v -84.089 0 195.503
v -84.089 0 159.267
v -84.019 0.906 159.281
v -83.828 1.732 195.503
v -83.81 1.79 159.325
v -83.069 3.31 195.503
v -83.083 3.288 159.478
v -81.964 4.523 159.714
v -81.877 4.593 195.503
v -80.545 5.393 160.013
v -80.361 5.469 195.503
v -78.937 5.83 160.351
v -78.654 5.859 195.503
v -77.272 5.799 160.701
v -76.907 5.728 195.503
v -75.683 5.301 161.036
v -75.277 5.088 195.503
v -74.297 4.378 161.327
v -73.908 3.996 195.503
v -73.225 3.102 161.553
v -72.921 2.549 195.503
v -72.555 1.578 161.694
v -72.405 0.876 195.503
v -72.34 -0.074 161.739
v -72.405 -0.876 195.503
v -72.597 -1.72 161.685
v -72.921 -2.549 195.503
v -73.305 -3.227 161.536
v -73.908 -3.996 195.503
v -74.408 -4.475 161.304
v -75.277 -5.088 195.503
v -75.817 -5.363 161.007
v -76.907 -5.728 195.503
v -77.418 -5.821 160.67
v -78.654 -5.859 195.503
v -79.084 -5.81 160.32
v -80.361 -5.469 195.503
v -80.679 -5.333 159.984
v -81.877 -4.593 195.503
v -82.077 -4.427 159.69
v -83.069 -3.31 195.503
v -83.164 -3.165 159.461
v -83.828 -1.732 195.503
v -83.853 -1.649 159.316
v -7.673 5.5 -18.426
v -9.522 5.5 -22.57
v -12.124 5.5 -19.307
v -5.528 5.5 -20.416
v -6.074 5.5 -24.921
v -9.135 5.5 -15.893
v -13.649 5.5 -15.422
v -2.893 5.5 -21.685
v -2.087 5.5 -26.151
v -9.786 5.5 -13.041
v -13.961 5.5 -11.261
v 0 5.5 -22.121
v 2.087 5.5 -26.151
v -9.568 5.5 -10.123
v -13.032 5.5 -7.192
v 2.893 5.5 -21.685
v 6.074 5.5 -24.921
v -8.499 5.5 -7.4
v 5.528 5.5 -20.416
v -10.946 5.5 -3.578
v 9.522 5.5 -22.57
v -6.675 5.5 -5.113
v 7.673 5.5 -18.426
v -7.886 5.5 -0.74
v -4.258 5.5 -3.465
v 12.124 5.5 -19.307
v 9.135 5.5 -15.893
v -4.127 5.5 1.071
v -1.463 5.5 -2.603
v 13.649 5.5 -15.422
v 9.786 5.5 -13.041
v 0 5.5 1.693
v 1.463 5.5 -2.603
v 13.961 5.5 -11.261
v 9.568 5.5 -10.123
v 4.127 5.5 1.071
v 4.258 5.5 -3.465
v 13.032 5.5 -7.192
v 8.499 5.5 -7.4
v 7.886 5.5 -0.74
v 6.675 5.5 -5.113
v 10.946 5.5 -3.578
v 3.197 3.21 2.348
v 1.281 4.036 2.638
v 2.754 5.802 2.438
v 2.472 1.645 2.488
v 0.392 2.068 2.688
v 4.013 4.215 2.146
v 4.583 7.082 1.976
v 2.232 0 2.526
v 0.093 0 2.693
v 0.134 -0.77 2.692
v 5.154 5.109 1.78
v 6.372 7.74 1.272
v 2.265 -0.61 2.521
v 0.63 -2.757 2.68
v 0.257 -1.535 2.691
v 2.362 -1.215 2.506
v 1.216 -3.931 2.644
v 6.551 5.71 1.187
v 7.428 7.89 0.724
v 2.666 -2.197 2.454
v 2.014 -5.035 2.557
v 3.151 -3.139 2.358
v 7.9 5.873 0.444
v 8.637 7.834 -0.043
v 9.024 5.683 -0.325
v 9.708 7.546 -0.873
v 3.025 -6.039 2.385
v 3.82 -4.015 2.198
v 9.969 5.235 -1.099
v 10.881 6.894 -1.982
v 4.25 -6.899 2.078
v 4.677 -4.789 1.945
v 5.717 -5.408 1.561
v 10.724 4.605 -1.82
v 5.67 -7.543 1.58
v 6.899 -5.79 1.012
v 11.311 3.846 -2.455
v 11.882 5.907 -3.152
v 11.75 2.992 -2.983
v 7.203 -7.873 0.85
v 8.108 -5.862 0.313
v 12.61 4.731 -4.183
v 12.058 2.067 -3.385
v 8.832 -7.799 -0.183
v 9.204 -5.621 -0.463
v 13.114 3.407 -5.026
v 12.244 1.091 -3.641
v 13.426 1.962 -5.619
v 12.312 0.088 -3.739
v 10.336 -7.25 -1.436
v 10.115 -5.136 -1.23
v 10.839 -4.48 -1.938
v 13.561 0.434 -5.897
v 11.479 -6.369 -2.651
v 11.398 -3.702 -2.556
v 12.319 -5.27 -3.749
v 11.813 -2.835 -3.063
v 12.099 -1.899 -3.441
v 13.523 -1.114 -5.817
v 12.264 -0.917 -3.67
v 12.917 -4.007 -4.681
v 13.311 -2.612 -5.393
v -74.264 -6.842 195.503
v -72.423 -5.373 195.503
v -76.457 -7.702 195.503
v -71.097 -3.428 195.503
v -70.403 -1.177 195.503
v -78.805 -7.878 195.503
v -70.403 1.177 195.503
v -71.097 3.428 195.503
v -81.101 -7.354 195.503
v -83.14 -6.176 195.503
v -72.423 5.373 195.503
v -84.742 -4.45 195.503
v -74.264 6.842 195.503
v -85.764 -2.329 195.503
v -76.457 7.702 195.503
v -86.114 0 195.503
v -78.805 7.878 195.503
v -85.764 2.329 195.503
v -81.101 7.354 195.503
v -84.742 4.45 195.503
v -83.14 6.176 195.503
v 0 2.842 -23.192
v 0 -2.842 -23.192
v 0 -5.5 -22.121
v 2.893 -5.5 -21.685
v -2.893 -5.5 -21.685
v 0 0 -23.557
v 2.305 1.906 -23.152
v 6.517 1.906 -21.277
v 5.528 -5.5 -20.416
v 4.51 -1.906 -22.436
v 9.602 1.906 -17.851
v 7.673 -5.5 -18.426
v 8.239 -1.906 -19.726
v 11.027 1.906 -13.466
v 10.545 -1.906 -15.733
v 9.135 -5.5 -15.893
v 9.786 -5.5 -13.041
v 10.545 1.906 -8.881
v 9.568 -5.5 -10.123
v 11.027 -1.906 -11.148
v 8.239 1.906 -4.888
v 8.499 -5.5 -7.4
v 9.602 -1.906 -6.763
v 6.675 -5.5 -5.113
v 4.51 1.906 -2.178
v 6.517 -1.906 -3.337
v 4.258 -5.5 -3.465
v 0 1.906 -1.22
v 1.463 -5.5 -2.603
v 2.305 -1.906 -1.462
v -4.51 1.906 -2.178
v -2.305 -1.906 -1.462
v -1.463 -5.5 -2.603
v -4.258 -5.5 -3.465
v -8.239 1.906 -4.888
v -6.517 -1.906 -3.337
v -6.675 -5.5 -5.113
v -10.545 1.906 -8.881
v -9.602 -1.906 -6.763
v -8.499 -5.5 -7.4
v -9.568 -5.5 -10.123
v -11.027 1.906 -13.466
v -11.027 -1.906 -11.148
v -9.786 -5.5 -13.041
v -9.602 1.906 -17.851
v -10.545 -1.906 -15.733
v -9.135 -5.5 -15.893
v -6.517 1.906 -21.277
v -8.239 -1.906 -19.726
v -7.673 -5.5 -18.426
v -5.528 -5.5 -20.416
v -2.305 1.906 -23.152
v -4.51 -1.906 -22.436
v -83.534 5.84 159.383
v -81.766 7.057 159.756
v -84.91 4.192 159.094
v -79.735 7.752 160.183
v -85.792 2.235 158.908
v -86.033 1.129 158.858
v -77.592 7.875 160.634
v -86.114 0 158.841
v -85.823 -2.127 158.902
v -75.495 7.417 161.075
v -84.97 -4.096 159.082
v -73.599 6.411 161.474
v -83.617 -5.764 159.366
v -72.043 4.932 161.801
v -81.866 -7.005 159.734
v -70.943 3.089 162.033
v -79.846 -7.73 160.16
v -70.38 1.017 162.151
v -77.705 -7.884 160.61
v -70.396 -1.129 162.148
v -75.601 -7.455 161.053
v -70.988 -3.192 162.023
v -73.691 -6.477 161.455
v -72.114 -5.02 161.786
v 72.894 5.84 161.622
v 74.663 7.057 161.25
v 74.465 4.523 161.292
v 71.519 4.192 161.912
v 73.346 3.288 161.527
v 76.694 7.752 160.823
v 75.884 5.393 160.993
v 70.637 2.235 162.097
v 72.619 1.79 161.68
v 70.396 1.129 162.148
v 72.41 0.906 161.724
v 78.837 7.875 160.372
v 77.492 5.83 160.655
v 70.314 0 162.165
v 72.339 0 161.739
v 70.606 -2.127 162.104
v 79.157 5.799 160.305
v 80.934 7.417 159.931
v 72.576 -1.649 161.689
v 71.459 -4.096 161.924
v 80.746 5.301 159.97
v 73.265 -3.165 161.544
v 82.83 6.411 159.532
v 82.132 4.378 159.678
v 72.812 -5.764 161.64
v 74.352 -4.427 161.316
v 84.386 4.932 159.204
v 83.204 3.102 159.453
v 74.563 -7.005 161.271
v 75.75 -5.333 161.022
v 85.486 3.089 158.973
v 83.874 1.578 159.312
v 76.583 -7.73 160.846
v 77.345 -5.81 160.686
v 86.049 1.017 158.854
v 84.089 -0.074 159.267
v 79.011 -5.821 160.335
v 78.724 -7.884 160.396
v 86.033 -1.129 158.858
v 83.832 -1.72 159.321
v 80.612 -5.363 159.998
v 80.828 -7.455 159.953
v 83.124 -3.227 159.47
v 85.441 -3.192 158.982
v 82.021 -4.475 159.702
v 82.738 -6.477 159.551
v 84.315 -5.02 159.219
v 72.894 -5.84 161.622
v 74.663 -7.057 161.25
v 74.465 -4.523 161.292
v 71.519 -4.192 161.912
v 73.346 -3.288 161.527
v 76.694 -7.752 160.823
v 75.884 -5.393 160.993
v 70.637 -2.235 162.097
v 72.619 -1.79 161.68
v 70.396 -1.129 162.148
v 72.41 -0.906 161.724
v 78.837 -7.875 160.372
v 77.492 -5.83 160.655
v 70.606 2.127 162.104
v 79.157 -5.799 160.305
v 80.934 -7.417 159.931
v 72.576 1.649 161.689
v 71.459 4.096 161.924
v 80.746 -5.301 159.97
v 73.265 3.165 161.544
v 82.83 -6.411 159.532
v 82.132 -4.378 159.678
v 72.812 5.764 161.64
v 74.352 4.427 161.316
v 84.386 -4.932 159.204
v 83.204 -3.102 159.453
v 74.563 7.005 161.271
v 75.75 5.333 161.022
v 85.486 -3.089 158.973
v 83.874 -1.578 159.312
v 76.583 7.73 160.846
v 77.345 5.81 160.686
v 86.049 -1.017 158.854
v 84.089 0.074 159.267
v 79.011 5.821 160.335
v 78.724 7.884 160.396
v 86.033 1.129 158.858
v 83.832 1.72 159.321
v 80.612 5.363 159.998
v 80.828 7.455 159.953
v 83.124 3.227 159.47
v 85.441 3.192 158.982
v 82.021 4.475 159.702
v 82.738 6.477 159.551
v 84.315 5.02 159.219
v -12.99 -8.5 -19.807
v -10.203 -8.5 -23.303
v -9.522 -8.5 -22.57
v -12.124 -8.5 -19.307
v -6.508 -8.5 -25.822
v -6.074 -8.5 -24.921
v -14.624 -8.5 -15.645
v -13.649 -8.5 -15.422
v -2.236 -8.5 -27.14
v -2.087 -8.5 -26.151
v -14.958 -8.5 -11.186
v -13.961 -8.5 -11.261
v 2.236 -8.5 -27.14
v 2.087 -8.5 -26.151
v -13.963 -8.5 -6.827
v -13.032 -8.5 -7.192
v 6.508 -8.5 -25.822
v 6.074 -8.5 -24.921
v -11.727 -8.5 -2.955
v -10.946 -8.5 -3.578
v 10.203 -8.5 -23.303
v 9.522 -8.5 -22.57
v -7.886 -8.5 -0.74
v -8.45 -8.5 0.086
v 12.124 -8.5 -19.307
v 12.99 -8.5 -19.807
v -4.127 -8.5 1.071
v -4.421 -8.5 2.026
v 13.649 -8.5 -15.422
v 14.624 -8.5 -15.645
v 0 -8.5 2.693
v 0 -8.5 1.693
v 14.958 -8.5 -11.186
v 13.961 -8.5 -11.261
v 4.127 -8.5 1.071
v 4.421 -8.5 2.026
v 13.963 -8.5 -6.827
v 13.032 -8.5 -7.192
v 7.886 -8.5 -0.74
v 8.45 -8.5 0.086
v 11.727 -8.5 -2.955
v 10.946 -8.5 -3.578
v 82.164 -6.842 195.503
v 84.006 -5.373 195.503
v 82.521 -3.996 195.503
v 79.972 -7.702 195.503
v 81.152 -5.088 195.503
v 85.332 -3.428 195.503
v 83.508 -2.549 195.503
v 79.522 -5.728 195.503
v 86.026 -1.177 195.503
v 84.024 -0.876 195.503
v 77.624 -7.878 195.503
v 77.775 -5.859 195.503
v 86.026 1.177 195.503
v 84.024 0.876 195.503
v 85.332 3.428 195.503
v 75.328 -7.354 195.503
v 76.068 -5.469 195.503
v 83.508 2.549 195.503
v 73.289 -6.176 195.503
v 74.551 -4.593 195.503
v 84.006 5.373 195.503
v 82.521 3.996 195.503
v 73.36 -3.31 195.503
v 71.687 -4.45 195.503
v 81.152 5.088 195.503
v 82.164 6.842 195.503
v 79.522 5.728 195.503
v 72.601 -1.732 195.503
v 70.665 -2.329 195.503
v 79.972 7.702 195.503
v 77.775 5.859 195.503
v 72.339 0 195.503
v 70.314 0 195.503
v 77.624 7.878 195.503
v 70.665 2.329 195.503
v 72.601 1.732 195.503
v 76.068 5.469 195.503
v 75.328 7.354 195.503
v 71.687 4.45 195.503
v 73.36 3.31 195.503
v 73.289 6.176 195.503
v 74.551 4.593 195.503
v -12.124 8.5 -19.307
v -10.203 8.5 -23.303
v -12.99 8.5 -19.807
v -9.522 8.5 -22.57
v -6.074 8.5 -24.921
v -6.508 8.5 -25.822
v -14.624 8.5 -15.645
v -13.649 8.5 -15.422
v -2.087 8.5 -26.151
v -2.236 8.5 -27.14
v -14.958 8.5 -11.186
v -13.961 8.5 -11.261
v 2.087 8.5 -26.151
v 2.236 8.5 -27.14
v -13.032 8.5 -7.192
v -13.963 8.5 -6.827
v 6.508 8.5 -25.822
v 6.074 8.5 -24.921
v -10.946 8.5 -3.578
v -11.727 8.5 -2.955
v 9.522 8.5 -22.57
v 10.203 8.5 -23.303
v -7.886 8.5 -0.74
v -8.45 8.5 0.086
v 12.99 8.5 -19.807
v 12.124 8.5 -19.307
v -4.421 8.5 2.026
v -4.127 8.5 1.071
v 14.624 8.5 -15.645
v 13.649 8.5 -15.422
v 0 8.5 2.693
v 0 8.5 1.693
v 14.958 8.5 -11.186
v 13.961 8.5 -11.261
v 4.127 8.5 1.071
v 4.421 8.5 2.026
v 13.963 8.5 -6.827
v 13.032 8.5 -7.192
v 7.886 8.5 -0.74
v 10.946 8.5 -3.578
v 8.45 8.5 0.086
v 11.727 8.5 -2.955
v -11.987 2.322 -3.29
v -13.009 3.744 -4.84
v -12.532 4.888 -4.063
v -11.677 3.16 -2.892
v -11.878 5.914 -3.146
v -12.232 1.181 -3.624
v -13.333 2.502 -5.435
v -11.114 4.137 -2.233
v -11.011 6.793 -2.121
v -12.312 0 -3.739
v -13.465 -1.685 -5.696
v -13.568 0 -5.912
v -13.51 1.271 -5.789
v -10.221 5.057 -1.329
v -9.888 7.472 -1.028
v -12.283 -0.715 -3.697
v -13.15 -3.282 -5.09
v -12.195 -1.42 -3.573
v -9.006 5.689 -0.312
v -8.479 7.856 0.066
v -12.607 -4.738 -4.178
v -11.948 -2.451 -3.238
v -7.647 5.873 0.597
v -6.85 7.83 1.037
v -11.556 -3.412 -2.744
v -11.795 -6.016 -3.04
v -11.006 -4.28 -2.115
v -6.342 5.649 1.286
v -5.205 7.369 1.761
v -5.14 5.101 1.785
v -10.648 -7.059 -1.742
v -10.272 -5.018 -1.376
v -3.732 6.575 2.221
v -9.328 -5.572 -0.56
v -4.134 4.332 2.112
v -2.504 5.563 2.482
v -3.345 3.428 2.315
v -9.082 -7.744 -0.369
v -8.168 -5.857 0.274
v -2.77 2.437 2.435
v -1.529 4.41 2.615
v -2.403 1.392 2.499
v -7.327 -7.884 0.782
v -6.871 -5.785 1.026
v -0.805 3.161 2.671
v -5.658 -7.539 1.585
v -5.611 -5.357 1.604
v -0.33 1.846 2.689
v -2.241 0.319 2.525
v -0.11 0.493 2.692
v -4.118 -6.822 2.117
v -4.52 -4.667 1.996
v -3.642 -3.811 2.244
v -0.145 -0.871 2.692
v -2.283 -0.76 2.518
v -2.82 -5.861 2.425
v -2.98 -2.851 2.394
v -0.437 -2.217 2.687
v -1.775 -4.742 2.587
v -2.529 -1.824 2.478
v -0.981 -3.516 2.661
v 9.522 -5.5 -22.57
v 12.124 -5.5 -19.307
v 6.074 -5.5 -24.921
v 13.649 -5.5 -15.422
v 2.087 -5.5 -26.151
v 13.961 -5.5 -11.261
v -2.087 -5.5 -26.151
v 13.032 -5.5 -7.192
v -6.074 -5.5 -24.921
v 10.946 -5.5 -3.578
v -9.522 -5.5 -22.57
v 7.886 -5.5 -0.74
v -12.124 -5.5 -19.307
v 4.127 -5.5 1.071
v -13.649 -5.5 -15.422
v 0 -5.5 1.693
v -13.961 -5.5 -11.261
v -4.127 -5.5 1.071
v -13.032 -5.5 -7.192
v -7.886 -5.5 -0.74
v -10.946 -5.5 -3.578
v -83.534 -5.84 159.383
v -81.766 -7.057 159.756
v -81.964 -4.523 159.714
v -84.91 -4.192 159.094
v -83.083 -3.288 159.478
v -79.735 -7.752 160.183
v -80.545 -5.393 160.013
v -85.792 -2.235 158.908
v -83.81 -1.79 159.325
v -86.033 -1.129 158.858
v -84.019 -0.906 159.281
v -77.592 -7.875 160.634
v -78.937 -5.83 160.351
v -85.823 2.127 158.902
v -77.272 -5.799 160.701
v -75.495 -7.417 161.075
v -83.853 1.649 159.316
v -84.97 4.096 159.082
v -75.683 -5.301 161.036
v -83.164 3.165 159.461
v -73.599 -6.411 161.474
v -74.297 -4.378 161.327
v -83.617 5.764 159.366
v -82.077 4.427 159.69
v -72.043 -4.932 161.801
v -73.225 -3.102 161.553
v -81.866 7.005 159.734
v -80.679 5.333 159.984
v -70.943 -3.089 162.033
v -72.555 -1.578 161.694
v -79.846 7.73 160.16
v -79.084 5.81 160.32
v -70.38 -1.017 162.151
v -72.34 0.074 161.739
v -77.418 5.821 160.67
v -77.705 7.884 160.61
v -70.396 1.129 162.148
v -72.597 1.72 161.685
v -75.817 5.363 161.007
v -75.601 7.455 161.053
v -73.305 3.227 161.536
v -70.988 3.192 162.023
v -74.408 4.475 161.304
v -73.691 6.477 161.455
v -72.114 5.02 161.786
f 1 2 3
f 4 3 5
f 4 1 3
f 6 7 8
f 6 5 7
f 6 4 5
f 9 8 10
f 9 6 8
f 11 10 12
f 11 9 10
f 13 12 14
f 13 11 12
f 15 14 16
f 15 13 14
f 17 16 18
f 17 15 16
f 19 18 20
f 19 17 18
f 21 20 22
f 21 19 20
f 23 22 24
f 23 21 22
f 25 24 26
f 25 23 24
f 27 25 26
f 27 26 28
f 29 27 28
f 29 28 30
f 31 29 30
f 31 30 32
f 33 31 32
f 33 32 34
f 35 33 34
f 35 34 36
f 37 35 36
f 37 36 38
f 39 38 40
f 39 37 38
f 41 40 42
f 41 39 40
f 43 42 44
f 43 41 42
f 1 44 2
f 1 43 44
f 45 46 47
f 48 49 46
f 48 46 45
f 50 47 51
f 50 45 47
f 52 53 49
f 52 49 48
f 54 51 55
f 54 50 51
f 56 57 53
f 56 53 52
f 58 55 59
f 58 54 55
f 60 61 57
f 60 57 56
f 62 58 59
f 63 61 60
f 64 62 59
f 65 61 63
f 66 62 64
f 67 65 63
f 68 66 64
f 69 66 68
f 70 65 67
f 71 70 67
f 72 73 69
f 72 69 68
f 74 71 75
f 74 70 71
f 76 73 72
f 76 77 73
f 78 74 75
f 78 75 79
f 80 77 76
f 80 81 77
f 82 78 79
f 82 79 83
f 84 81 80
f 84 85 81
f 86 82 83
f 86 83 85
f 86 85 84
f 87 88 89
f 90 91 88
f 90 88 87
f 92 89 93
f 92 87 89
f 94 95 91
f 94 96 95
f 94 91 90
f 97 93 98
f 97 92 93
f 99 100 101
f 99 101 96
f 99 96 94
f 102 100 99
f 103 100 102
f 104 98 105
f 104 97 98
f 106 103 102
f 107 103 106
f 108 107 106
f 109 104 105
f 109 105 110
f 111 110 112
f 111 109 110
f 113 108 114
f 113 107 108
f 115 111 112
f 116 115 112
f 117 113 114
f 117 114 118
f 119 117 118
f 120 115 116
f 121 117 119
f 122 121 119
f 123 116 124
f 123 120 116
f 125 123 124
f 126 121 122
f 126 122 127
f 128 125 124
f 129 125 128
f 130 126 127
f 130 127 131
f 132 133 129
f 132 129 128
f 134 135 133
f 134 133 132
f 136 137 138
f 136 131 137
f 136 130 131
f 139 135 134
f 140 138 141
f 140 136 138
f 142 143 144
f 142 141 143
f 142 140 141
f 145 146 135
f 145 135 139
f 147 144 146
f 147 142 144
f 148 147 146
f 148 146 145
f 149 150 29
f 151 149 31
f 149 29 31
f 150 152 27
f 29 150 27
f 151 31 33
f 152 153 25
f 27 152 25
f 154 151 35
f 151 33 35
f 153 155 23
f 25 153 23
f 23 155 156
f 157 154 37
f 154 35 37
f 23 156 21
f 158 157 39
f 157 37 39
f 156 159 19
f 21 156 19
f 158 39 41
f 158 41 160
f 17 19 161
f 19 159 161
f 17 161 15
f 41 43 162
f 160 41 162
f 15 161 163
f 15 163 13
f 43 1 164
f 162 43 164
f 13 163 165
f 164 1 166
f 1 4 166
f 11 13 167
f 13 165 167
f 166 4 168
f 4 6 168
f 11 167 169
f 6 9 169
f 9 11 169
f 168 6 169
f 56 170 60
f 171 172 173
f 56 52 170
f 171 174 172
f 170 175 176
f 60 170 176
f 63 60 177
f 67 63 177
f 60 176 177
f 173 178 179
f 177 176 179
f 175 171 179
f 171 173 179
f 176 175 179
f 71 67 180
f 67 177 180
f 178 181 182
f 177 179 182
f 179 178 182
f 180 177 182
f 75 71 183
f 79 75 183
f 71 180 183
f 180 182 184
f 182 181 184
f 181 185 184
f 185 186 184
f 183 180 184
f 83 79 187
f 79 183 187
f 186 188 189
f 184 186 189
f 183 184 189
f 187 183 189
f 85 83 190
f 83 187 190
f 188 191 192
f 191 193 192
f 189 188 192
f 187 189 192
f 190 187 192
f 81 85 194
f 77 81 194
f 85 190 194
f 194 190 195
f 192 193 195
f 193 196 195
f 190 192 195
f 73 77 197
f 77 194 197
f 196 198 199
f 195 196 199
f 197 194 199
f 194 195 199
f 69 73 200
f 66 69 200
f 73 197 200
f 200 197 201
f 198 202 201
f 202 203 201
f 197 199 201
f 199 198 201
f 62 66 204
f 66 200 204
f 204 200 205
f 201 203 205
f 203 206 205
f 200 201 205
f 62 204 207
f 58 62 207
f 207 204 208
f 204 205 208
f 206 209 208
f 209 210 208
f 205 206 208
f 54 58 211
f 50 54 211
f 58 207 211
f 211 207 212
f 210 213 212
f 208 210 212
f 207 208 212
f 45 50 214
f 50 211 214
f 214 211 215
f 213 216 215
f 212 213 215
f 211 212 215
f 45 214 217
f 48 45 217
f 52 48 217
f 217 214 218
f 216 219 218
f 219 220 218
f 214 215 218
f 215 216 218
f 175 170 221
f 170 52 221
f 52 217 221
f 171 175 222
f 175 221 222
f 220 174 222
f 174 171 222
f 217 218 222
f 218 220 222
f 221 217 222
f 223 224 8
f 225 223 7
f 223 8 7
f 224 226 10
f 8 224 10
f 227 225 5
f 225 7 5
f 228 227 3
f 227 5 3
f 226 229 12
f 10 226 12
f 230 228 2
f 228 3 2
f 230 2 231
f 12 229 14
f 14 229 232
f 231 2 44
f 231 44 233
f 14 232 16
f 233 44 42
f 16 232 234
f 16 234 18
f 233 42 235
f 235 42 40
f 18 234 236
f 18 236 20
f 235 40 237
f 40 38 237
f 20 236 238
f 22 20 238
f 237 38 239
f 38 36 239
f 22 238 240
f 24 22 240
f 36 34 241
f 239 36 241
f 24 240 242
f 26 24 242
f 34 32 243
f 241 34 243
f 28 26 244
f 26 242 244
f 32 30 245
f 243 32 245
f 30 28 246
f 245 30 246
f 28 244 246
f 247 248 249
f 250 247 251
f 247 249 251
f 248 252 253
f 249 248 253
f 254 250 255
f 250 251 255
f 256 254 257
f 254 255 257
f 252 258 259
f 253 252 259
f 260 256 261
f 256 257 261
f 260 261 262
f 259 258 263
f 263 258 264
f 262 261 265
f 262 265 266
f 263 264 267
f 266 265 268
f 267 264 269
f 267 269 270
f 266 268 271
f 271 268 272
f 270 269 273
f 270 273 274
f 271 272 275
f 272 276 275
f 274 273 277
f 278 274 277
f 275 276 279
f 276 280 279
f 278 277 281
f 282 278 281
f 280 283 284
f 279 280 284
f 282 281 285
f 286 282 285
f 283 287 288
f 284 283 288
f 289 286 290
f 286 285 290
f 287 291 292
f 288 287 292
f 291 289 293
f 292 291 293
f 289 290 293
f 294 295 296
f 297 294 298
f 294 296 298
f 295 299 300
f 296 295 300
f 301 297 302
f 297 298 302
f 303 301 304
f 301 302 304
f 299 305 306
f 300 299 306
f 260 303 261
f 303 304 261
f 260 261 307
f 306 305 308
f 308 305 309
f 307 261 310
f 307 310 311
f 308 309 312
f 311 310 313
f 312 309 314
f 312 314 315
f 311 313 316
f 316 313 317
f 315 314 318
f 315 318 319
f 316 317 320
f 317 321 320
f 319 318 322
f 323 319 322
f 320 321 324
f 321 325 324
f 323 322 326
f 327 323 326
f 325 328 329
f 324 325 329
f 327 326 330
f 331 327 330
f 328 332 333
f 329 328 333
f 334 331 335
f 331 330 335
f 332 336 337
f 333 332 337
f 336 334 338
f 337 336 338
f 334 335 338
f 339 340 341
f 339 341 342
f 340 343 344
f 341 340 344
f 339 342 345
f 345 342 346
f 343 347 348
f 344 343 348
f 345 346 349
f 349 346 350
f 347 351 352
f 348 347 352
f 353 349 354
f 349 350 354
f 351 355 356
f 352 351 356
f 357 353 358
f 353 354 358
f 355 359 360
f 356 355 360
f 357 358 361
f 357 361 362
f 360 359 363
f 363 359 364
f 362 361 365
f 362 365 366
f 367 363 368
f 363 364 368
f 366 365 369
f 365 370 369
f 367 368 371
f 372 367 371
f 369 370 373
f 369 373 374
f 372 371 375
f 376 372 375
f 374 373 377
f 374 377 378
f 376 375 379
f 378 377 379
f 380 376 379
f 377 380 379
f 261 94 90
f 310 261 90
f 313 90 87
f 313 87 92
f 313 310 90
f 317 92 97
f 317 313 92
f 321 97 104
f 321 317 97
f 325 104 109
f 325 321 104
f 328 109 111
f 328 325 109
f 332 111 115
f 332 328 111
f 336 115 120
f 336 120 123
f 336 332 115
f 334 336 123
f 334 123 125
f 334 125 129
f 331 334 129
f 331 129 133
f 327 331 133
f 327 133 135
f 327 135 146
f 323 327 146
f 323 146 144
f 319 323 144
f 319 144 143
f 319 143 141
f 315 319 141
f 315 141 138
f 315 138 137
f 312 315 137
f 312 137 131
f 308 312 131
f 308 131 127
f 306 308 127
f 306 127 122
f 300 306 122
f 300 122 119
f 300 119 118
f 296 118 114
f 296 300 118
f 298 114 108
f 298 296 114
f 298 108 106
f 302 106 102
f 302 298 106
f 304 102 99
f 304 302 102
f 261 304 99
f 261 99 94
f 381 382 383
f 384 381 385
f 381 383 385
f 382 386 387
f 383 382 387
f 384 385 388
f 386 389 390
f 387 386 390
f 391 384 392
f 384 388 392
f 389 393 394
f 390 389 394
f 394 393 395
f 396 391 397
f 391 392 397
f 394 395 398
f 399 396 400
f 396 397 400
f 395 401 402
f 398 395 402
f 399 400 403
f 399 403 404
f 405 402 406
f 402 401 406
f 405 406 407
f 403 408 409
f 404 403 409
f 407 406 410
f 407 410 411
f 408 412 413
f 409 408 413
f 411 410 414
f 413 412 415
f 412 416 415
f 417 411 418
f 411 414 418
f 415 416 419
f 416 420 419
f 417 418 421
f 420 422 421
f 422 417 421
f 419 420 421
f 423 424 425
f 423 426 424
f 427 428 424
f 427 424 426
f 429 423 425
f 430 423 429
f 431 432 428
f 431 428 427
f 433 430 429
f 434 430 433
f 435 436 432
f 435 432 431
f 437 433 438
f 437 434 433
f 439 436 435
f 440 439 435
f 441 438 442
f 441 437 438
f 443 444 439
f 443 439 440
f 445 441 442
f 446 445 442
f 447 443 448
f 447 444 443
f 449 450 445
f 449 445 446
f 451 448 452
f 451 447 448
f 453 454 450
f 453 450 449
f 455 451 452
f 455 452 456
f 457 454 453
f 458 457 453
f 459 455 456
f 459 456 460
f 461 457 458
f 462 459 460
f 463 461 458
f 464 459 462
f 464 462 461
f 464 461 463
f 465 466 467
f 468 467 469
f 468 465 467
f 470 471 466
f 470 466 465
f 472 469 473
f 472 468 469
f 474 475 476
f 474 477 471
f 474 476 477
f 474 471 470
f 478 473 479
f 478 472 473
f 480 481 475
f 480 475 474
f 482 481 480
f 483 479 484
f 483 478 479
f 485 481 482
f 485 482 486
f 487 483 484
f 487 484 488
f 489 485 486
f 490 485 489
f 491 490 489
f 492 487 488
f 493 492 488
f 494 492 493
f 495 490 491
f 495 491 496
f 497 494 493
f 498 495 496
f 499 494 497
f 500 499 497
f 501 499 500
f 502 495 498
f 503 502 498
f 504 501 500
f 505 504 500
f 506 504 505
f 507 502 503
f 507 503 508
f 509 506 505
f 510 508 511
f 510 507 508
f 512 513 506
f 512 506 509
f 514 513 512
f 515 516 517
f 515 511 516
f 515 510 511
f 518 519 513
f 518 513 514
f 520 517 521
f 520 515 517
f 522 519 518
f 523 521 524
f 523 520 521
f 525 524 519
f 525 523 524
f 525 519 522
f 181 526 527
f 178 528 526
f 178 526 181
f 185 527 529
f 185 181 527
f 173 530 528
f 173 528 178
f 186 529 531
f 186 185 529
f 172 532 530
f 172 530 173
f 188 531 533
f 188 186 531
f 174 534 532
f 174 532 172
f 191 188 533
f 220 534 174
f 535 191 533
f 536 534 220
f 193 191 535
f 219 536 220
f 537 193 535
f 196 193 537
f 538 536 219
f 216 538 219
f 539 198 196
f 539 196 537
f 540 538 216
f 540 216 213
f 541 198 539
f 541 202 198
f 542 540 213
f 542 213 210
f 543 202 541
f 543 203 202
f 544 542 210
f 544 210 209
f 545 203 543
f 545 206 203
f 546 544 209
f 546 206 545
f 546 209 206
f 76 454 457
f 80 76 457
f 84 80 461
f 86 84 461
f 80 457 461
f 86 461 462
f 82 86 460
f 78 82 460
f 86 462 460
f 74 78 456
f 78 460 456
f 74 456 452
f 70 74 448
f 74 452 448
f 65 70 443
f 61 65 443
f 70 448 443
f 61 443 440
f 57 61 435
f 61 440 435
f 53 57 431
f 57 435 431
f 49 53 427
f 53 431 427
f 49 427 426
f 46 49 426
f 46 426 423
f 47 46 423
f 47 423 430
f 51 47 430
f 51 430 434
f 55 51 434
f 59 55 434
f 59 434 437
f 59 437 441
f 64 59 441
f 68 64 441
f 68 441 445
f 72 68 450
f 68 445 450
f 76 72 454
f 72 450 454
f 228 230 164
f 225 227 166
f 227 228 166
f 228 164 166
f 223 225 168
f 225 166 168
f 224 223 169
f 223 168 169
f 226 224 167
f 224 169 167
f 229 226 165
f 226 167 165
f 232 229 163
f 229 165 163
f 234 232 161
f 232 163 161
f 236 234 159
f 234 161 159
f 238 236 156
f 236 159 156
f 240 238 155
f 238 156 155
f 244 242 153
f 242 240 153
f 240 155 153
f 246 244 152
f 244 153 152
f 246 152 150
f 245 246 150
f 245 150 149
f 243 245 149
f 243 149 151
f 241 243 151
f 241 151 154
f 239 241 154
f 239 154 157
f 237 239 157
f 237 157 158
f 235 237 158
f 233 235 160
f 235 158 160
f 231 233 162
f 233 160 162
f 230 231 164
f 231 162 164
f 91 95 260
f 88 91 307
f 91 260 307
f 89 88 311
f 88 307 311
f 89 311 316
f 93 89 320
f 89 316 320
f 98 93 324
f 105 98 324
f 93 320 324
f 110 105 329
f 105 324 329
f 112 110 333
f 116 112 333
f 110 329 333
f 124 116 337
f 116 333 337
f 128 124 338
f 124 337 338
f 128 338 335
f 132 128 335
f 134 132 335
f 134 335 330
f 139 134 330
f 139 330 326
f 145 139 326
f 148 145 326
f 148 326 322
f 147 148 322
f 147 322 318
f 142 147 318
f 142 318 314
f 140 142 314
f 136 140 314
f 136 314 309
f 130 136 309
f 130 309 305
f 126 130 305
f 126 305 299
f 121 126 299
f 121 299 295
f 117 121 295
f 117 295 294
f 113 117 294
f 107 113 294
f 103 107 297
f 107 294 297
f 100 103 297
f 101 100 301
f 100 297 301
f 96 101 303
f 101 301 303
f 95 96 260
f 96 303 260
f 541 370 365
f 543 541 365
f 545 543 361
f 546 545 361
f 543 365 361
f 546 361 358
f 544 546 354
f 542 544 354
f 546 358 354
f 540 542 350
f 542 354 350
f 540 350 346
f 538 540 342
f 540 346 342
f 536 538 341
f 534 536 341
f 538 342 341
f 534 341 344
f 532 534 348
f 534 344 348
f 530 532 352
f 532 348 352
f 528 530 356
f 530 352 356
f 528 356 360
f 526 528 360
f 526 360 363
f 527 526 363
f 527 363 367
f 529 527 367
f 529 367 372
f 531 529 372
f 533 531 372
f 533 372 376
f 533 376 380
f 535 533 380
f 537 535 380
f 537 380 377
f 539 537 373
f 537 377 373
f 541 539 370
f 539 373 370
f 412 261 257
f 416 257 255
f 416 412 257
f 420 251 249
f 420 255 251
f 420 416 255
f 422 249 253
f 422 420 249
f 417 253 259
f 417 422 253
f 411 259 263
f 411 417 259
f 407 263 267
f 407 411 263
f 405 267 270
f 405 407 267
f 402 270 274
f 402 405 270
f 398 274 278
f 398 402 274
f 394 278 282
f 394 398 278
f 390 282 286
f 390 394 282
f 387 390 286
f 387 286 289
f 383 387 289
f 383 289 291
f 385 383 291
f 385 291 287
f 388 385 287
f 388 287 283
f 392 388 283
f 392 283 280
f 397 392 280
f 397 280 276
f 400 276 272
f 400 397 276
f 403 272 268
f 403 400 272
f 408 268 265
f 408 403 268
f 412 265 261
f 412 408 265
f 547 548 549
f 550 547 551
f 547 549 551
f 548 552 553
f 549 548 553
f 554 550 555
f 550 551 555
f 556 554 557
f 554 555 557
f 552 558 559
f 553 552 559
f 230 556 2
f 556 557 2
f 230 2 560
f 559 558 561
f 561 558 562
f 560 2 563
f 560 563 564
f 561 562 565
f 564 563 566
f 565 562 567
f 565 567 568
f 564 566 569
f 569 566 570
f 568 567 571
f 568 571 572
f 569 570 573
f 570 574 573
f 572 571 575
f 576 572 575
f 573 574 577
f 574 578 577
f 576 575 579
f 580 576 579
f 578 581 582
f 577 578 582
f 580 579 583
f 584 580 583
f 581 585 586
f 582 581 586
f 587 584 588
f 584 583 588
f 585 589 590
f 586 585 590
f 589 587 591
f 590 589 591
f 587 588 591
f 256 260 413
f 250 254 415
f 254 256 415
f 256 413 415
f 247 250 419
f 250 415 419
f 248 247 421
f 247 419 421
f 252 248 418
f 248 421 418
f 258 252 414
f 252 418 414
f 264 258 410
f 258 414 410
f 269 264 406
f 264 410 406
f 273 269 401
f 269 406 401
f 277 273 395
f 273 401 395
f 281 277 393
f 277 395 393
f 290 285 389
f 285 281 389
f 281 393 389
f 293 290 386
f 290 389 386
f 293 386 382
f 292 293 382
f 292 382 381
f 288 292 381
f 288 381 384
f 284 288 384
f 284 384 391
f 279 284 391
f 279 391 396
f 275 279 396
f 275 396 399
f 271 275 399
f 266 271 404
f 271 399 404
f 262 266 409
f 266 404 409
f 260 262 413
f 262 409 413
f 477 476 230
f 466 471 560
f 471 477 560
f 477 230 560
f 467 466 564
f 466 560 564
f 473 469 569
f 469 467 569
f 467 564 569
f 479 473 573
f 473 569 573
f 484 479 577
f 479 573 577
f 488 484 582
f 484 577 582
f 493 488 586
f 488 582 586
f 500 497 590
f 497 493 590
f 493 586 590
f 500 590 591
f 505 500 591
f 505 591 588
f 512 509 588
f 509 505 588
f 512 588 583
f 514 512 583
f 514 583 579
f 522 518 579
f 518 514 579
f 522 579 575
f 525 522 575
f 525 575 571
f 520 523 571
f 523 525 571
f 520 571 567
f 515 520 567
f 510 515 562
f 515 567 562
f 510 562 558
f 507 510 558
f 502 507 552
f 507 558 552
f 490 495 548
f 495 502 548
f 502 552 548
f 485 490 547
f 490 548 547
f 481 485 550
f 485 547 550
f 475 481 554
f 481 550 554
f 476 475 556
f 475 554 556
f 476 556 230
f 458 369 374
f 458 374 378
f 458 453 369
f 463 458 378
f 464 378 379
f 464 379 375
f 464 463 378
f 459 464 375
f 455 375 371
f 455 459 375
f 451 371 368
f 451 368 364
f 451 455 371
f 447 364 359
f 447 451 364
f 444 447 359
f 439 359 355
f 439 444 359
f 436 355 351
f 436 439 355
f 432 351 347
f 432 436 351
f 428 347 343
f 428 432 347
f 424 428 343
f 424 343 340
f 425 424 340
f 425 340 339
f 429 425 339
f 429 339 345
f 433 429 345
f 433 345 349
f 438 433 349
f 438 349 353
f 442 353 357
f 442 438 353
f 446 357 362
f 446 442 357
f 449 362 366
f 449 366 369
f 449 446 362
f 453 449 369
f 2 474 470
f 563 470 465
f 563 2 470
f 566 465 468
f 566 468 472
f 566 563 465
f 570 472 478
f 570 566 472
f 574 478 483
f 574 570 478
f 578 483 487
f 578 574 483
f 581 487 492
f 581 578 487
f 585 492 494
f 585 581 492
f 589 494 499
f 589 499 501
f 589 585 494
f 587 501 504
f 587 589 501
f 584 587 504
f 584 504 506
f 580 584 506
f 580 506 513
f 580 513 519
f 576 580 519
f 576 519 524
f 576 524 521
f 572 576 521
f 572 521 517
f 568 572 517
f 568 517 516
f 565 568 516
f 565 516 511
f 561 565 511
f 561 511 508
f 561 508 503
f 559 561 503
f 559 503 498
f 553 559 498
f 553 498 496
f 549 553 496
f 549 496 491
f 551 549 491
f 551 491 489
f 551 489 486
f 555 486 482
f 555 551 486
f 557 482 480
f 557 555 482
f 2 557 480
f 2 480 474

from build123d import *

# Parameters (mm, degrees)
SKETCH1_ON_SEGMENT_1_R                  = 7.9
SKETCH1_ON_SEGMENT_1_R_2                = 5.875
CIRCULAR_TUBE_21_3_X_2_3_1_DEPTH        = 38.350868903
CIRCULAR_TUBE_21_3_X_2_3_1_2_DEPTH      = 178.412650039
CIRCULAR_TUBE_21_3_X_2_3_1_2_DEPTH_BACK = 3.350868903
SKETCH1_R                               = 7.9
SKETCH1_R_2                             = 5.875
SKETCH11_ON_SEGMENT_1_R                 = 7.9
SKETCH11_ON_SEGMENT_1_R_2               = 5.875
CIRCULAR_TUBE_21_3_X_2_3_2_DEPTH        = 38.350868903
CIRCULAR_TUBE_21_3_X_2_3_2_2_DEPTH      = 178.412650039
CIRCULAR_TUBE_21_3_X_2_3_2_2_DEPTH_BACK = 3.350868903
SKETCH11_R                              = 7.9
SKETCH11_R_2                            = 5.875
SKETCH_1_R                              = 15
EXTRUDE_1_DEPTH                         = 8.5
SKETCH_5_R                              = 14
CUT_EXTRUDE_1_DEPTH                     = 3
SKETCH_7_R                              = 14
CUT_EXTRUDE_2_DEPTH                     = 3
WELD_START                              = -9
WELD_TRIM_4_DEPTH                       = 18
WELD_TRIM_4_2_DEPTH                     = 18


with BuildPart() as part:
    # Sketch1 on segment 1 (carried to segment 1) → Circular tube 21.3 X 2.3(1) (new body)
    with BuildSketch(Plane(origin=(-78.21449332, 0, 195.502886979), x_dir=(-1, 0, 0), z_dir=(0, 0, -1))):
        Circle(SKETCH1_ON_SEGMENT_1_R)
        Circle(SKETCH1_ON_SEGMENT_1_R_2, mode=Mode.SUBTRACT)
    extrude(amount=CIRCULAR_TUBE_21_3_X_2_3_1_DEPTH)

    # Circular tube 21.3 X 2.3(1) mitre 1
    split(bisect_by=Plane(origin=(-78.21449332, 0, 160.502886979), x_dir=(0, -1, 0), z_dir=(-0.205910543, 0, 0.978570819)), keep=Keep.TOP)


with BuildPart() as body_2:
    # Sketch1 → Circular tube 21.3 X 2.3_1 2 (new, two sides: drawn at the far end of the back side and taken through both)
    with BuildSketch(Plane(origin=(-78.21449332, 0, 160.502886979), x_dir=(-0.9152016968098962, 0, -0.4029960969491974), z_dir=(0.4029960969491974, 0, -0.9152016968098962)).offset(-CIRCULAR_TUBE_21_3_X_2_3_1_2_DEPTH_BACK)):
        Circle(SKETCH1_R)
        Circle(SKETCH1_R_2, mode=Mode.SUBTRACT)
    extrude(amount=CIRCULAR_TUBE_21_3_X_2_3_1_2_DEPTH + CIRCULAR_TUBE_21_3_X_2_3_1_2_DEPTH_BACK)

    # Circular tube 21.3 X 2.3_1 2 mitre 1
    split(bisect_by=Plane(origin=(-78.21449332, 0, 160.502886979), x_dir=(0, 1, 0), z_dir=(0.205910543, 0, -0.978570819)), keep=Keep.TOP)


with BuildPart() as body_3:
    # Sketch11 on segment 1 (carried to segment 1) → Circular tube 21.3 X 2.3(2) (new body)
    with BuildSketch(Plane(origin=(78.21449332, 0, 195.502886979), x_dir=(-1, 0, 0), z_dir=(0, 0, -1))):
        Circle(SKETCH11_ON_SEGMENT_1_R)
        Circle(SKETCH11_ON_SEGMENT_1_R_2, mode=Mode.SUBTRACT)
    extrude(amount=CIRCULAR_TUBE_21_3_X_2_3_2_DEPTH)

    # Circular tube 21.3 X 2.3(2) mitre 1
    split(bisect_by=Plane(origin=(78.21449332, 0, 160.502886979), x_dir=(0, -1, 0), z_dir=(0.205910543, 0, 0.978570819)), keep=Keep.TOP)


with BuildPart() as body_4:
    # Sketch11 → Circular tube 21.3 X 2.3_2 2 (new, two sides: drawn at the far end of the back side and taken through both)
    with BuildSketch(Plane(origin=(78.21449332, 0, 160.502886979), x_dir=(-0.9152016968098962, 0, 0.40299609694919775), z_dir=(-0.40299609694919775, 0, -0.9152016968098962)).offset(-CIRCULAR_TUBE_21_3_X_2_3_2_2_DEPTH_BACK)):
        Circle(SKETCH11_R)
        Circle(SKETCH11_R_2, mode=Mode.SUBTRACT)
    extrude(amount=CIRCULAR_TUBE_21_3_X_2_3_2_2_DEPTH + CIRCULAR_TUBE_21_3_X_2_3_2_2_DEPTH_BACK)

    # Circular tube 21.3 X 2.3_2 2 mitre 1
    split(bisect_by=Plane(origin=(78.21449332, 0, 160.502886979), x_dir=(0, 1, 0), z_dir=(-0.205910543, 0, -0.978570819)), keep=Keep.TOP)


with BuildPart() as body_5:
    # 스케치1 → 보스-돌출1 (new, symmetric)
    with BuildSketch(Plane(origin=(0, 0, 0), x_dir=(1, 0, 0), z_dir=(0, 1, 0))):
        with Locations(Location((0, 12.307113021, 0), (0, 0, 270))):
            Circle(SKETCH_1_R)
    extrude(amount=EXTRUDE_1_DEPTH, both=True)


with BuildPart() as cut_extrude_1_tool:
    # 스케치5 → 컷-돌출1 (new body)
    with BuildSketch(Plane(origin=(0, 8.5, 0), x_dir=(1, 0, 0), z_dir=(0, 1, 0))):
        with Locations(Location((0, 12.307113021, 0), (0, 0, 270))):
            Circle(SKETCH_5_R)
    extrude(amount=-CUT_EXTRUDE_1_DEPTH)


with BuildPart() as body_2_1:
    add(body_2.part)

    # 컷-돌출1: cut by cut_extrude_1_tool
    add(cut_extrude_1_tool.part, mode=Mode.SUBTRACT)


with BuildPart() as body_4_1:
    add(body_4.part)

    # 컷-돌출1: cut by cut_extrude_1_tool
    add(cut_extrude_1_tool.part, mode=Mode.SUBTRACT)


with BuildPart() as body_5_1:
    add(body_5.part)

    # 컷-돌출1: cut by cut_extrude_1_tool
    add(cut_extrude_1_tool.part, mode=Mode.SUBTRACT)


with BuildPart() as cut_extrude_2_tool:
    # 스케치7 → 컷-돌출2 (new body)
    with BuildSketch(Plane.XZ.offset(8.5)):
        with Locations(Location((0, -12.307113021, 0), (0, 0, 90))):
            Circle(SKETCH_7_R)
    extrude(amount=-CUT_EXTRUDE_2_DEPTH)


with BuildPart() as body_2_2:
    add(body_2_1.part)

    # 컷-돌출2: cut by cut_extrude_2_tool
    add(cut_extrude_2_tool.part, mode=Mode.SUBTRACT)

    # Weld Trim 4 2 outline → Weld Trim 4 2 (cut)
    with BuildSketch(Plane(origin=(0, 0, 0), x_dir=(1, 0, 0), z_dir=(0, 1, 0)).offset(WELD_START)):
        with BuildLine():
            ThreePointArc((-13.56855558, 5.912247934), (-8.072813552, -0.335263392), (-0.092992229, -2.692598725))
            Line((-0.092992229, -2.692598725), (2, -2.705574442))
            Line((2, -2.705574442), (2, -0.880671656))
            Line((2, -0.880671656), (0.915201697, -0.402996097))
            Line((0.915201697, -0.402996097), (-4.424689992, 1.948349531))
            Line((-4.424689992, 1.948349531), (-8.205093424, 3.612996606))
            Line((-8.205093424, 3.612996606), (-13.544985113, 5.964342235))
            Line((-13.544985113, 5.964342235), (-13.60570988, 5.991081524))
            Line((-13.60570988, 5.991081524), (-13.56855558, 5.912247934))
        make_face()
    extrude(amount=WELD_TRIM_4_2_DEPTH, mode=Mode.SUBTRACT)


with BuildPart() as body_4_2:
    add(body_4_1.part)

    # 컷-돌출2: cut by cut_extrude_2_tool
    add(cut_extrude_2_tool.part, mode=Mode.SUBTRACT)

    # Weld Trim 4: read off the stored shape, not the designer's step
    # Weld Trim 4 outline → Weld Trim 4 (cut)
    with BuildSketch(Plane(origin=(0, 0, 0), x_dir=(1, 0, 0), z_dir=(0, 1, 0)).offset(WELD_START)):
        with BuildLine():
            ThreePointArc((0.092364574, -2.692602603), (8.072226744, -0.33563808), (13.568229514, 5.911556137))
            Line((13.568229514, 5.911556137), (13.605716105, 5.991084266))
            Line((13.605716105, 5.991084266), (13.544985113, 5.964342235))
            Line((13.544985113, 5.964342235), (8.205093424, 3.612996607))
            Line((8.205093424, 3.612996607), (4.424689992, 1.948349532))
            Line((4.424689992, 1.948349532), (-0.915201697, -0.402996097))
            Line((-0.915201697, -0.402996097), (-2, -0.880671655))
            Line((-2, -0.880671655), (-2, -2.705486871))
            Line((-2, -2.705486871), (0.092364574, -2.692602603))
        make_face()
    extrude(amount=WELD_TRIM_4_DEPTH, mode=Mode.SUBTRACT)


with BuildPart() as body_5_2:
    add(body_5_1.part)

    # 컷-돌출2: cut by cut_extrude_2_tool
    add(cut_extrude_2_tool.part, mode=Mode.SUBTRACT)

    # 스케치9 → 컷-회전1 (revolve, cut)
    with BuildSketch(Plane(origin=(0, 0, 0), x_dir=(0, 0, -1), z_dir=(1, 0, 0))):
        with BuildLine():
            Line((12.307113021, -11.25), (12.307113021, 11.25))
            ThreePointArc((12.307113021, 11.25), (23.557113021, 0), (12.307113021, -11.25))
        make_face()
    revolve(axis=Axis((0, 8.5, -12.307113021), (0, -1, 0)), mode=Mode.SUBTRACT)


solid = Compound([part.part, body_3.part, body_2_2.part, body_4_2.part, body_5_2.part])
